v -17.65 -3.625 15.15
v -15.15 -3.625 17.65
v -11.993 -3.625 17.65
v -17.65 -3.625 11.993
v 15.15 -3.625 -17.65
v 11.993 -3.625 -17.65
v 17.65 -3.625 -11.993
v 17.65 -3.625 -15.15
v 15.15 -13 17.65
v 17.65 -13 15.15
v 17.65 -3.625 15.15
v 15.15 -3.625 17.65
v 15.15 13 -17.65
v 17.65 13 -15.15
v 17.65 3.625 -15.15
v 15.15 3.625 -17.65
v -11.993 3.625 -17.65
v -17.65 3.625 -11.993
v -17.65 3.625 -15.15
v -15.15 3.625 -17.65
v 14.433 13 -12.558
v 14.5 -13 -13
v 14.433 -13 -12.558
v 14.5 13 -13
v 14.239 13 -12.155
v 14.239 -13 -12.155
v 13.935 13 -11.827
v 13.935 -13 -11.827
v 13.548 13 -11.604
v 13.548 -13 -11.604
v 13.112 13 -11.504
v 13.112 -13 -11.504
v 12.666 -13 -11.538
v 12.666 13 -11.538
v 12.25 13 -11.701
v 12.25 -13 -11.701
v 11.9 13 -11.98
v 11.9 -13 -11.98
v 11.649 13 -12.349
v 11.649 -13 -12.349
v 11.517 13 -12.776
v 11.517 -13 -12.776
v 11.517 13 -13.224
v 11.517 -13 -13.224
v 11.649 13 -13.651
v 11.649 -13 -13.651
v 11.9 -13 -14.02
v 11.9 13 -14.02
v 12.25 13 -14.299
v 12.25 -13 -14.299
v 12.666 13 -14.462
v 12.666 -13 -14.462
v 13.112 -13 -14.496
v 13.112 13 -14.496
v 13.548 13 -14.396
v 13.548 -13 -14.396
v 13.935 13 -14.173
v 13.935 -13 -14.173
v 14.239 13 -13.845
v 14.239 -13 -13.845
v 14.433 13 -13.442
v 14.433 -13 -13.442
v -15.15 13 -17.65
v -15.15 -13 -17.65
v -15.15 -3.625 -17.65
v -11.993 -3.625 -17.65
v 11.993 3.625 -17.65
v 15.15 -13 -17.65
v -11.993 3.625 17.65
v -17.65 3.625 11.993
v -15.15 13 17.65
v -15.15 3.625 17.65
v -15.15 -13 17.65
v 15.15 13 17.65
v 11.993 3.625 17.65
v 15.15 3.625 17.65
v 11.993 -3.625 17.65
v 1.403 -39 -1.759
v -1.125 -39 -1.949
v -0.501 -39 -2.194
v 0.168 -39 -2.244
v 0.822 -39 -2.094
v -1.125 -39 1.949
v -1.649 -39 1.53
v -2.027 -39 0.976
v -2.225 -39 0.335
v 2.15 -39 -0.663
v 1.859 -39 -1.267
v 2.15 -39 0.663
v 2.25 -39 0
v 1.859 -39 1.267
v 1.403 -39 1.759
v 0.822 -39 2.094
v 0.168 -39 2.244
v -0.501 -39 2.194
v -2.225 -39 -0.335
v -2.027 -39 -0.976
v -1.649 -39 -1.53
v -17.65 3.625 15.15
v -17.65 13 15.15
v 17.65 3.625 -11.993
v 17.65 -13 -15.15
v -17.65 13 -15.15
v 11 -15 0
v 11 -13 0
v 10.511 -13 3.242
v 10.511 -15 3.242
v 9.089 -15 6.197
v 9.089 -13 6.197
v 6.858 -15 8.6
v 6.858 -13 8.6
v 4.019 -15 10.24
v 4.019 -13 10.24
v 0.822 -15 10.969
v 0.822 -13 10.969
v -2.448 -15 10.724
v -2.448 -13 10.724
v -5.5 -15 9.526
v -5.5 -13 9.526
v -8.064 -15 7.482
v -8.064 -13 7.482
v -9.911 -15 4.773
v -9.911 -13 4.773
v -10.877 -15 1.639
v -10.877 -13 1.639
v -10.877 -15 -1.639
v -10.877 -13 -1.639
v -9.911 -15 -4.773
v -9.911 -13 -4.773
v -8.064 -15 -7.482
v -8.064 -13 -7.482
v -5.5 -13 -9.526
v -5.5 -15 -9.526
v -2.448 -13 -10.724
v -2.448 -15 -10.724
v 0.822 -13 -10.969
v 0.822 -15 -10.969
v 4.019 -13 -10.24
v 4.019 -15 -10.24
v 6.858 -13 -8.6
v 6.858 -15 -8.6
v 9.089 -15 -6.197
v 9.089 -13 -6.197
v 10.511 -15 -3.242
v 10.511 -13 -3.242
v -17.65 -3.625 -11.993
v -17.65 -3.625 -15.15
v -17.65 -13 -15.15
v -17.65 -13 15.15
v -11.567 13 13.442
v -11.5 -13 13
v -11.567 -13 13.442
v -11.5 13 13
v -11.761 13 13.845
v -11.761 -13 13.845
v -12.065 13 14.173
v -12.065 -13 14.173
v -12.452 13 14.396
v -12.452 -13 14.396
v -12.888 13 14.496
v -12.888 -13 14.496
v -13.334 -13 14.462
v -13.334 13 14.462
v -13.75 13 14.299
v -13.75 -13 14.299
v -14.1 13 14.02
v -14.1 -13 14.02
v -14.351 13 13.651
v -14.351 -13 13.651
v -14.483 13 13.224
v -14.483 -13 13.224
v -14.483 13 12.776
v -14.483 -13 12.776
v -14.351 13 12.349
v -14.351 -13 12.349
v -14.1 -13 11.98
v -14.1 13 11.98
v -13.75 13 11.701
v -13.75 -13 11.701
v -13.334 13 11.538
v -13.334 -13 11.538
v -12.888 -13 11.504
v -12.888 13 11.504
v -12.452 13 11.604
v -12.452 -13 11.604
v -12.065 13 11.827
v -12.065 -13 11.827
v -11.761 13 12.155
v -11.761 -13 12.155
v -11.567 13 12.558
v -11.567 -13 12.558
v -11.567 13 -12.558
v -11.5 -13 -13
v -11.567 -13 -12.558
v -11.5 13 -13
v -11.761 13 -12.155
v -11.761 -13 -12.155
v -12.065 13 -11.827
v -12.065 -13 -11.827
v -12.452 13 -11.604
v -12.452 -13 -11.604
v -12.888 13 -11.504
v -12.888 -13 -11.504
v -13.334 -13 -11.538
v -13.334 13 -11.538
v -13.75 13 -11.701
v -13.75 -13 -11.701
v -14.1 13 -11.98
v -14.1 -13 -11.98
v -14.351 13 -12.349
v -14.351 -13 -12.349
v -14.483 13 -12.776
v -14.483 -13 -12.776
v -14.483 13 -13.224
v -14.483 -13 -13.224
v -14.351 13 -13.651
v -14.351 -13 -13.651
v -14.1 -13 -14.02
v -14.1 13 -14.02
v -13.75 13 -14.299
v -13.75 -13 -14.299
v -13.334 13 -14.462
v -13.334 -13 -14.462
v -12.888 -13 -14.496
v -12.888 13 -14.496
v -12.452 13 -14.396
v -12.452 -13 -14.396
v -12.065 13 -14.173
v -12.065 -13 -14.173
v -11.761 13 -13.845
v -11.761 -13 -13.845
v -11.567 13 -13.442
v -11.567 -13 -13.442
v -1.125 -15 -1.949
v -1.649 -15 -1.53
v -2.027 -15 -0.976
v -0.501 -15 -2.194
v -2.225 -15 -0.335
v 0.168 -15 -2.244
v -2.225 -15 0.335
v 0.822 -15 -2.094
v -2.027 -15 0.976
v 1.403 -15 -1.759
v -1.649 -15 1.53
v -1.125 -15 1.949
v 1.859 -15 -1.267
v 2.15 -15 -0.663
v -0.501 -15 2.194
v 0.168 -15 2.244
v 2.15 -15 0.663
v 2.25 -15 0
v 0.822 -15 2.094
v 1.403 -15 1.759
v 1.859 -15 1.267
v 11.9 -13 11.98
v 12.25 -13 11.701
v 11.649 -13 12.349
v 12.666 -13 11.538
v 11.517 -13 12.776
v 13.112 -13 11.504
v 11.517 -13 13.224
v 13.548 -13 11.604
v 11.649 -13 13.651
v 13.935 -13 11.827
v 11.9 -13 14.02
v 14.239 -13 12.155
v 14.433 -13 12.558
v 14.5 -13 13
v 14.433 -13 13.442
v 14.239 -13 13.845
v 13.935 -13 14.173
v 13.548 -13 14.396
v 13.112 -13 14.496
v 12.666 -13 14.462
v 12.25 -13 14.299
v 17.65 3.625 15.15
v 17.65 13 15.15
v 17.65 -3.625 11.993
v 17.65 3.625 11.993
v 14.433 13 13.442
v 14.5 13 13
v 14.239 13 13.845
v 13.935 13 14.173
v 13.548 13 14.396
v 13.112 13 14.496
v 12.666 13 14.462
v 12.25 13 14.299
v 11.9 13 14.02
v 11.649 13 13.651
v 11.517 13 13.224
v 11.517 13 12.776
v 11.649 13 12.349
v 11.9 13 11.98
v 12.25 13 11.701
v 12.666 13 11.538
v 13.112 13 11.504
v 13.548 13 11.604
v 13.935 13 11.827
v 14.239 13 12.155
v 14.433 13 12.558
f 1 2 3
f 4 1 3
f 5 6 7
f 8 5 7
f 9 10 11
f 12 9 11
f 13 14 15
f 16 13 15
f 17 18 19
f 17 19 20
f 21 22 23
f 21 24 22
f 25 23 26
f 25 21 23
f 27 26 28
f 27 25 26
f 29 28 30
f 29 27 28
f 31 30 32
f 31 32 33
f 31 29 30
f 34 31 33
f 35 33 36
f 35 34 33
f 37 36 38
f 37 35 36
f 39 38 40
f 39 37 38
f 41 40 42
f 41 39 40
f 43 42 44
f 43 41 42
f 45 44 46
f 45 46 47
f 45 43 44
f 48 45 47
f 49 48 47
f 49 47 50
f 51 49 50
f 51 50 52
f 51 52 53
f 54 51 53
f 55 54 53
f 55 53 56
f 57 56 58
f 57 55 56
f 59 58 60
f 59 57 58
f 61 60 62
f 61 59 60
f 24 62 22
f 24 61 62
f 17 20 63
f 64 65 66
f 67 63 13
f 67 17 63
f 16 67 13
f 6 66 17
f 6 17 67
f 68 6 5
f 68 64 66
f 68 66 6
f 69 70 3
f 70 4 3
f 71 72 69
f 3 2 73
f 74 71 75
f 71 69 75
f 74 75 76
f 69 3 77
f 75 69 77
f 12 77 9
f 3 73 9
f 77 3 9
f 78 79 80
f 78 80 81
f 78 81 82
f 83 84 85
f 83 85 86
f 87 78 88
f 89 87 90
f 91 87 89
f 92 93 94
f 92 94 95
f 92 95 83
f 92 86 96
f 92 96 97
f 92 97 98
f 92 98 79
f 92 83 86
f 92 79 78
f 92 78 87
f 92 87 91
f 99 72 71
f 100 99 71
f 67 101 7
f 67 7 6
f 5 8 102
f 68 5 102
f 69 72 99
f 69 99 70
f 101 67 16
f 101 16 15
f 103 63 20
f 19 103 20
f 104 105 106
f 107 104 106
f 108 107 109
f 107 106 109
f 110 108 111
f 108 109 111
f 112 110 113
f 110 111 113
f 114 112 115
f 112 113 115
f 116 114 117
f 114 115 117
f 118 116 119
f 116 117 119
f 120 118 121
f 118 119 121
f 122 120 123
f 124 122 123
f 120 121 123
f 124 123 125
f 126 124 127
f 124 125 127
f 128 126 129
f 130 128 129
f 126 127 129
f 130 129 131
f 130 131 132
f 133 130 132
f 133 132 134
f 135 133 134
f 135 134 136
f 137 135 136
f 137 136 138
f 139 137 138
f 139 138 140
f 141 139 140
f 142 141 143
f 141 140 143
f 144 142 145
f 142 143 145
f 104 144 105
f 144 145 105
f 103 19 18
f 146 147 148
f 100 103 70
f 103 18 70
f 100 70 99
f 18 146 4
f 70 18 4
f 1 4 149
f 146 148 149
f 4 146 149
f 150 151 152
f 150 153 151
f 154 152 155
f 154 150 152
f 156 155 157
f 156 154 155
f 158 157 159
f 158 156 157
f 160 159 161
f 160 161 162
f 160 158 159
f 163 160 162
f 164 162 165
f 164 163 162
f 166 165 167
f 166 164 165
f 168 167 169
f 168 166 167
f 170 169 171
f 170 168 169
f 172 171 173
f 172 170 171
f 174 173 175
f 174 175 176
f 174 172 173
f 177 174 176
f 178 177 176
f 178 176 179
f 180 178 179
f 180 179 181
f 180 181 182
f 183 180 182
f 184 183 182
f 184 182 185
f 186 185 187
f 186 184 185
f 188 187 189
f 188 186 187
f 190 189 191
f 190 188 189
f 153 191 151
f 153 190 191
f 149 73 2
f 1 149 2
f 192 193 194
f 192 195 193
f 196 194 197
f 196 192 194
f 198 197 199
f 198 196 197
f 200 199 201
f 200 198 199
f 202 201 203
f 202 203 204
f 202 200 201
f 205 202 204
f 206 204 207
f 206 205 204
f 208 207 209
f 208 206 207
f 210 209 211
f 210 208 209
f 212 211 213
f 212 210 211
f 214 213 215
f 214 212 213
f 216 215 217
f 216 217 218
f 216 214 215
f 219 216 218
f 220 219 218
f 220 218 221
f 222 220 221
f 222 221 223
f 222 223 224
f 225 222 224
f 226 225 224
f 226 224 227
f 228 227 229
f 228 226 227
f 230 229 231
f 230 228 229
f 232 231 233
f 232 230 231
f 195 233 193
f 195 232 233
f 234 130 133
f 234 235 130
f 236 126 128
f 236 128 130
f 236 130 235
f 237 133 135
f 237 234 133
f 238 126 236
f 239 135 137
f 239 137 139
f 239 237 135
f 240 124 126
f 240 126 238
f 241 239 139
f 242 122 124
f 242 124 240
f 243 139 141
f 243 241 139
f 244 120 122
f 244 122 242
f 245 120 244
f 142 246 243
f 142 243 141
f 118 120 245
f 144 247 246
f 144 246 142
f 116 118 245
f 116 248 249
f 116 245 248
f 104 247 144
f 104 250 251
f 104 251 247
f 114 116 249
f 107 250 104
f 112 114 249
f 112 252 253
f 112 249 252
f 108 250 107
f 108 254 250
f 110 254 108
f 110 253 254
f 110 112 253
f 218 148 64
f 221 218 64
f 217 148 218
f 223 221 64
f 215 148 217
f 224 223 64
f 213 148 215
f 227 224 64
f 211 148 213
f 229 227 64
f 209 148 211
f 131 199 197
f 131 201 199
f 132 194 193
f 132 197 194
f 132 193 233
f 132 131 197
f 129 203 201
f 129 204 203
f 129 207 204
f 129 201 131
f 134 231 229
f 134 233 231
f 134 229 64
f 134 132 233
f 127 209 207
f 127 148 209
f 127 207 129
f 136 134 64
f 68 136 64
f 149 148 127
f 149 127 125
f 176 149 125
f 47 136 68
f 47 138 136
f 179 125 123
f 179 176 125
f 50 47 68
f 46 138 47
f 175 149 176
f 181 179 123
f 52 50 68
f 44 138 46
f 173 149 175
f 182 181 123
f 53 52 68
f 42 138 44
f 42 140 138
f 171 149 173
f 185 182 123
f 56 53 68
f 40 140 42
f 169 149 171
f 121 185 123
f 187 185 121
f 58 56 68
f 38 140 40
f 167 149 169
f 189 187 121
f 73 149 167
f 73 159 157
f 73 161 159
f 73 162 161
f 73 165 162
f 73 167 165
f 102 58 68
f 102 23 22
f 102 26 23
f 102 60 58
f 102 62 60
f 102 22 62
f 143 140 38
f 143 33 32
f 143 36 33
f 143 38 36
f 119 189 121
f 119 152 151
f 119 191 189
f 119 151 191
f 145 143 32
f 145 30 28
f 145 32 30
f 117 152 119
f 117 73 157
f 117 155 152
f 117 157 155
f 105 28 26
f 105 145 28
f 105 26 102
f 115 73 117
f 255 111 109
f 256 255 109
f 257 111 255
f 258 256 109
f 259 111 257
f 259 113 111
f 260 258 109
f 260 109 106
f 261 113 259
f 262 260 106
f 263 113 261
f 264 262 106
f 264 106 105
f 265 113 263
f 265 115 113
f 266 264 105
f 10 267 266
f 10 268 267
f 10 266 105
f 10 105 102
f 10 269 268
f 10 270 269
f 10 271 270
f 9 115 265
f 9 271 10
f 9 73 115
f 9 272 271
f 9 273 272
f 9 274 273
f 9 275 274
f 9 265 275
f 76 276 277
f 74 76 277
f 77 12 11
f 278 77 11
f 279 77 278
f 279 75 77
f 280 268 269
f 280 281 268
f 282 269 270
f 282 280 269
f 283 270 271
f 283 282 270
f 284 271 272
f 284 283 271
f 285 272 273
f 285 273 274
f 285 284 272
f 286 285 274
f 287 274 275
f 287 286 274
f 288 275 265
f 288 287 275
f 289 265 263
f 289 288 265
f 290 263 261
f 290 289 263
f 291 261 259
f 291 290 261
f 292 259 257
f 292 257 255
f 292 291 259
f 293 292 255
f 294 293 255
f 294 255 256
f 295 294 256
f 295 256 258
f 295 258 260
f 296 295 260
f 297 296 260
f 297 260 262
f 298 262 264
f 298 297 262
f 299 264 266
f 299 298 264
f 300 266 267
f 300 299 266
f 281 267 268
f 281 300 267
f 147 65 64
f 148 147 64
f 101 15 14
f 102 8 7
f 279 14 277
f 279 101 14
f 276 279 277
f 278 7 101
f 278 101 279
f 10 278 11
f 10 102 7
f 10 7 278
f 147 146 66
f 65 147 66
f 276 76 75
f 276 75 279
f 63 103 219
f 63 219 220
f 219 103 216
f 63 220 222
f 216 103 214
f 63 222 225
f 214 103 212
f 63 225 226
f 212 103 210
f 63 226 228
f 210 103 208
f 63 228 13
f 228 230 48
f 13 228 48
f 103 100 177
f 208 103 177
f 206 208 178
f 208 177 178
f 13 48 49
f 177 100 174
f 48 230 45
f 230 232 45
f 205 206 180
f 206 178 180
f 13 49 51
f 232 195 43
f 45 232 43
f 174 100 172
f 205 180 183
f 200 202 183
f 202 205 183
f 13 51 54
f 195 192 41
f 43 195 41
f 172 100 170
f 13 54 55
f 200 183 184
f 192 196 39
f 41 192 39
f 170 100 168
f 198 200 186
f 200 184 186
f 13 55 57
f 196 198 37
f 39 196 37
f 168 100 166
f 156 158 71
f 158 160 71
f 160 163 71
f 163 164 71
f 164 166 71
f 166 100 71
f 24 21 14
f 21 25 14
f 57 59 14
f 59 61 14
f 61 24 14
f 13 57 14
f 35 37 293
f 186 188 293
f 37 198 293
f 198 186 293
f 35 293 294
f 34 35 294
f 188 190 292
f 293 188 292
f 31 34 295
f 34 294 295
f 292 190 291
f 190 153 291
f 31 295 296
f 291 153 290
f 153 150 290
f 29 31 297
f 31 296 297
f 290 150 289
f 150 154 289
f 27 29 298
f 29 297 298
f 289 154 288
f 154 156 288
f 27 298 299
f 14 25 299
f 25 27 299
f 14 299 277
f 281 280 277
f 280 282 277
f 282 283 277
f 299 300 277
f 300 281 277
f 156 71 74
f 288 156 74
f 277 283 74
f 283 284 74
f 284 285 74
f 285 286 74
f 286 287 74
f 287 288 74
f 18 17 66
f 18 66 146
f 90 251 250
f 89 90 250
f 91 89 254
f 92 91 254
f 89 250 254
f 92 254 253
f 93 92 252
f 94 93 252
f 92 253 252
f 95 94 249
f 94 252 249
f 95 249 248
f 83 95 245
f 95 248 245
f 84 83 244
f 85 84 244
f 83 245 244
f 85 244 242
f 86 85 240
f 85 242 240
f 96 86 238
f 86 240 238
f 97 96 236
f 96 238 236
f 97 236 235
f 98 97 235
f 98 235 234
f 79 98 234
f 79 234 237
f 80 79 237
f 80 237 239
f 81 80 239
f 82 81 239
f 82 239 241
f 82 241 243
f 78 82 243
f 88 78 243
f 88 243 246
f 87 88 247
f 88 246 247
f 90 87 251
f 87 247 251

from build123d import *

# Parameters (mm, degrees)
F0_W     = 35.3
F0_H     = 35.3
F0_R     = 1.5
F1_DEPTH = 13
F2_R     = 11
F3_DEPTH = 2
F4_R     = 2.25
F5_DEPTH = 24
F7_DEPTH = 3.625
F8_SIZE  = 2.5


with BuildPart() as f1:
    # F0 (on Front) → F1 (new body, symmetric)
    with BuildSketch(Plane.XZ):
        Rectangle(F0_W, F0_H)
        with Locations((-13, -13)):
            Circle(F0_R, mode=Mode.SUBTRACT)
        with Locations((13, -13)):
            Circle(F0_R, mode=Mode.SUBTRACT)
        with Locations((-13, 13)):
            Circle(F0_R, mode=Mode.SUBTRACT)
        with Locations((13, 13)):
            Circle(F0_R, mode=Mode.SUBTRACT)
    extrude(amount=F1_DEPTH, both=True)

    # F2 (on face) → F3 (join)
    with BuildSketch(Plane.XZ.offset(13)):
        Circle(F2_R)
    extrude(amount=F3_DEPTH)

    # F4 (on face) → F5 (join)
    with BuildSketch(Plane.XZ.offset(15)):
        Circle(F4_R)
    extrude(amount=F5_DEPTH)

    # F6 (on Front) → F7 (cut, symmetric)
    with BuildSketch(Plane.XZ):
        Polygon((17.65, 17.65), (11.9931457505, 17.65), (17.65, 11.9931457505), align=None)
        Polygon((11.9931457505, -17.65), (17.65, -17.65), (17.65, -11.9931457505), align=None)
        Polygon((-17.65, -11.9931457505), (-17.65, -17.65), (-11.9931457505, -17.65), align=None)
        Polygon((-11.9931457505, 17.65), (-17.65, 17.65), (-17.65, 11.9931457505), align=None)
    extrude(amount=F7_DEPTH, both=True, mode=Mode.SUBTRACT)

    # F8
    f8_edges = [f1.edges().sort_by_distance(p)[0] for p in [
        (17.65, -8.3125, 17.65),
        (17.65, 8.3125, 17.65),
        (-17.65, 8.3125, 17.65),
        (-17.65, -8.3125, 17.65),
        (17.65, 8.3125, -17.65),
        (17.65, -8.3125, -17.65),
        (-17.65, -8.3125, -17.65),
        (-17.65, 8.3125, -17.65),
    ]]
    chamfer(f8_edges, length=F8_SIZE)


solid = f1.part
